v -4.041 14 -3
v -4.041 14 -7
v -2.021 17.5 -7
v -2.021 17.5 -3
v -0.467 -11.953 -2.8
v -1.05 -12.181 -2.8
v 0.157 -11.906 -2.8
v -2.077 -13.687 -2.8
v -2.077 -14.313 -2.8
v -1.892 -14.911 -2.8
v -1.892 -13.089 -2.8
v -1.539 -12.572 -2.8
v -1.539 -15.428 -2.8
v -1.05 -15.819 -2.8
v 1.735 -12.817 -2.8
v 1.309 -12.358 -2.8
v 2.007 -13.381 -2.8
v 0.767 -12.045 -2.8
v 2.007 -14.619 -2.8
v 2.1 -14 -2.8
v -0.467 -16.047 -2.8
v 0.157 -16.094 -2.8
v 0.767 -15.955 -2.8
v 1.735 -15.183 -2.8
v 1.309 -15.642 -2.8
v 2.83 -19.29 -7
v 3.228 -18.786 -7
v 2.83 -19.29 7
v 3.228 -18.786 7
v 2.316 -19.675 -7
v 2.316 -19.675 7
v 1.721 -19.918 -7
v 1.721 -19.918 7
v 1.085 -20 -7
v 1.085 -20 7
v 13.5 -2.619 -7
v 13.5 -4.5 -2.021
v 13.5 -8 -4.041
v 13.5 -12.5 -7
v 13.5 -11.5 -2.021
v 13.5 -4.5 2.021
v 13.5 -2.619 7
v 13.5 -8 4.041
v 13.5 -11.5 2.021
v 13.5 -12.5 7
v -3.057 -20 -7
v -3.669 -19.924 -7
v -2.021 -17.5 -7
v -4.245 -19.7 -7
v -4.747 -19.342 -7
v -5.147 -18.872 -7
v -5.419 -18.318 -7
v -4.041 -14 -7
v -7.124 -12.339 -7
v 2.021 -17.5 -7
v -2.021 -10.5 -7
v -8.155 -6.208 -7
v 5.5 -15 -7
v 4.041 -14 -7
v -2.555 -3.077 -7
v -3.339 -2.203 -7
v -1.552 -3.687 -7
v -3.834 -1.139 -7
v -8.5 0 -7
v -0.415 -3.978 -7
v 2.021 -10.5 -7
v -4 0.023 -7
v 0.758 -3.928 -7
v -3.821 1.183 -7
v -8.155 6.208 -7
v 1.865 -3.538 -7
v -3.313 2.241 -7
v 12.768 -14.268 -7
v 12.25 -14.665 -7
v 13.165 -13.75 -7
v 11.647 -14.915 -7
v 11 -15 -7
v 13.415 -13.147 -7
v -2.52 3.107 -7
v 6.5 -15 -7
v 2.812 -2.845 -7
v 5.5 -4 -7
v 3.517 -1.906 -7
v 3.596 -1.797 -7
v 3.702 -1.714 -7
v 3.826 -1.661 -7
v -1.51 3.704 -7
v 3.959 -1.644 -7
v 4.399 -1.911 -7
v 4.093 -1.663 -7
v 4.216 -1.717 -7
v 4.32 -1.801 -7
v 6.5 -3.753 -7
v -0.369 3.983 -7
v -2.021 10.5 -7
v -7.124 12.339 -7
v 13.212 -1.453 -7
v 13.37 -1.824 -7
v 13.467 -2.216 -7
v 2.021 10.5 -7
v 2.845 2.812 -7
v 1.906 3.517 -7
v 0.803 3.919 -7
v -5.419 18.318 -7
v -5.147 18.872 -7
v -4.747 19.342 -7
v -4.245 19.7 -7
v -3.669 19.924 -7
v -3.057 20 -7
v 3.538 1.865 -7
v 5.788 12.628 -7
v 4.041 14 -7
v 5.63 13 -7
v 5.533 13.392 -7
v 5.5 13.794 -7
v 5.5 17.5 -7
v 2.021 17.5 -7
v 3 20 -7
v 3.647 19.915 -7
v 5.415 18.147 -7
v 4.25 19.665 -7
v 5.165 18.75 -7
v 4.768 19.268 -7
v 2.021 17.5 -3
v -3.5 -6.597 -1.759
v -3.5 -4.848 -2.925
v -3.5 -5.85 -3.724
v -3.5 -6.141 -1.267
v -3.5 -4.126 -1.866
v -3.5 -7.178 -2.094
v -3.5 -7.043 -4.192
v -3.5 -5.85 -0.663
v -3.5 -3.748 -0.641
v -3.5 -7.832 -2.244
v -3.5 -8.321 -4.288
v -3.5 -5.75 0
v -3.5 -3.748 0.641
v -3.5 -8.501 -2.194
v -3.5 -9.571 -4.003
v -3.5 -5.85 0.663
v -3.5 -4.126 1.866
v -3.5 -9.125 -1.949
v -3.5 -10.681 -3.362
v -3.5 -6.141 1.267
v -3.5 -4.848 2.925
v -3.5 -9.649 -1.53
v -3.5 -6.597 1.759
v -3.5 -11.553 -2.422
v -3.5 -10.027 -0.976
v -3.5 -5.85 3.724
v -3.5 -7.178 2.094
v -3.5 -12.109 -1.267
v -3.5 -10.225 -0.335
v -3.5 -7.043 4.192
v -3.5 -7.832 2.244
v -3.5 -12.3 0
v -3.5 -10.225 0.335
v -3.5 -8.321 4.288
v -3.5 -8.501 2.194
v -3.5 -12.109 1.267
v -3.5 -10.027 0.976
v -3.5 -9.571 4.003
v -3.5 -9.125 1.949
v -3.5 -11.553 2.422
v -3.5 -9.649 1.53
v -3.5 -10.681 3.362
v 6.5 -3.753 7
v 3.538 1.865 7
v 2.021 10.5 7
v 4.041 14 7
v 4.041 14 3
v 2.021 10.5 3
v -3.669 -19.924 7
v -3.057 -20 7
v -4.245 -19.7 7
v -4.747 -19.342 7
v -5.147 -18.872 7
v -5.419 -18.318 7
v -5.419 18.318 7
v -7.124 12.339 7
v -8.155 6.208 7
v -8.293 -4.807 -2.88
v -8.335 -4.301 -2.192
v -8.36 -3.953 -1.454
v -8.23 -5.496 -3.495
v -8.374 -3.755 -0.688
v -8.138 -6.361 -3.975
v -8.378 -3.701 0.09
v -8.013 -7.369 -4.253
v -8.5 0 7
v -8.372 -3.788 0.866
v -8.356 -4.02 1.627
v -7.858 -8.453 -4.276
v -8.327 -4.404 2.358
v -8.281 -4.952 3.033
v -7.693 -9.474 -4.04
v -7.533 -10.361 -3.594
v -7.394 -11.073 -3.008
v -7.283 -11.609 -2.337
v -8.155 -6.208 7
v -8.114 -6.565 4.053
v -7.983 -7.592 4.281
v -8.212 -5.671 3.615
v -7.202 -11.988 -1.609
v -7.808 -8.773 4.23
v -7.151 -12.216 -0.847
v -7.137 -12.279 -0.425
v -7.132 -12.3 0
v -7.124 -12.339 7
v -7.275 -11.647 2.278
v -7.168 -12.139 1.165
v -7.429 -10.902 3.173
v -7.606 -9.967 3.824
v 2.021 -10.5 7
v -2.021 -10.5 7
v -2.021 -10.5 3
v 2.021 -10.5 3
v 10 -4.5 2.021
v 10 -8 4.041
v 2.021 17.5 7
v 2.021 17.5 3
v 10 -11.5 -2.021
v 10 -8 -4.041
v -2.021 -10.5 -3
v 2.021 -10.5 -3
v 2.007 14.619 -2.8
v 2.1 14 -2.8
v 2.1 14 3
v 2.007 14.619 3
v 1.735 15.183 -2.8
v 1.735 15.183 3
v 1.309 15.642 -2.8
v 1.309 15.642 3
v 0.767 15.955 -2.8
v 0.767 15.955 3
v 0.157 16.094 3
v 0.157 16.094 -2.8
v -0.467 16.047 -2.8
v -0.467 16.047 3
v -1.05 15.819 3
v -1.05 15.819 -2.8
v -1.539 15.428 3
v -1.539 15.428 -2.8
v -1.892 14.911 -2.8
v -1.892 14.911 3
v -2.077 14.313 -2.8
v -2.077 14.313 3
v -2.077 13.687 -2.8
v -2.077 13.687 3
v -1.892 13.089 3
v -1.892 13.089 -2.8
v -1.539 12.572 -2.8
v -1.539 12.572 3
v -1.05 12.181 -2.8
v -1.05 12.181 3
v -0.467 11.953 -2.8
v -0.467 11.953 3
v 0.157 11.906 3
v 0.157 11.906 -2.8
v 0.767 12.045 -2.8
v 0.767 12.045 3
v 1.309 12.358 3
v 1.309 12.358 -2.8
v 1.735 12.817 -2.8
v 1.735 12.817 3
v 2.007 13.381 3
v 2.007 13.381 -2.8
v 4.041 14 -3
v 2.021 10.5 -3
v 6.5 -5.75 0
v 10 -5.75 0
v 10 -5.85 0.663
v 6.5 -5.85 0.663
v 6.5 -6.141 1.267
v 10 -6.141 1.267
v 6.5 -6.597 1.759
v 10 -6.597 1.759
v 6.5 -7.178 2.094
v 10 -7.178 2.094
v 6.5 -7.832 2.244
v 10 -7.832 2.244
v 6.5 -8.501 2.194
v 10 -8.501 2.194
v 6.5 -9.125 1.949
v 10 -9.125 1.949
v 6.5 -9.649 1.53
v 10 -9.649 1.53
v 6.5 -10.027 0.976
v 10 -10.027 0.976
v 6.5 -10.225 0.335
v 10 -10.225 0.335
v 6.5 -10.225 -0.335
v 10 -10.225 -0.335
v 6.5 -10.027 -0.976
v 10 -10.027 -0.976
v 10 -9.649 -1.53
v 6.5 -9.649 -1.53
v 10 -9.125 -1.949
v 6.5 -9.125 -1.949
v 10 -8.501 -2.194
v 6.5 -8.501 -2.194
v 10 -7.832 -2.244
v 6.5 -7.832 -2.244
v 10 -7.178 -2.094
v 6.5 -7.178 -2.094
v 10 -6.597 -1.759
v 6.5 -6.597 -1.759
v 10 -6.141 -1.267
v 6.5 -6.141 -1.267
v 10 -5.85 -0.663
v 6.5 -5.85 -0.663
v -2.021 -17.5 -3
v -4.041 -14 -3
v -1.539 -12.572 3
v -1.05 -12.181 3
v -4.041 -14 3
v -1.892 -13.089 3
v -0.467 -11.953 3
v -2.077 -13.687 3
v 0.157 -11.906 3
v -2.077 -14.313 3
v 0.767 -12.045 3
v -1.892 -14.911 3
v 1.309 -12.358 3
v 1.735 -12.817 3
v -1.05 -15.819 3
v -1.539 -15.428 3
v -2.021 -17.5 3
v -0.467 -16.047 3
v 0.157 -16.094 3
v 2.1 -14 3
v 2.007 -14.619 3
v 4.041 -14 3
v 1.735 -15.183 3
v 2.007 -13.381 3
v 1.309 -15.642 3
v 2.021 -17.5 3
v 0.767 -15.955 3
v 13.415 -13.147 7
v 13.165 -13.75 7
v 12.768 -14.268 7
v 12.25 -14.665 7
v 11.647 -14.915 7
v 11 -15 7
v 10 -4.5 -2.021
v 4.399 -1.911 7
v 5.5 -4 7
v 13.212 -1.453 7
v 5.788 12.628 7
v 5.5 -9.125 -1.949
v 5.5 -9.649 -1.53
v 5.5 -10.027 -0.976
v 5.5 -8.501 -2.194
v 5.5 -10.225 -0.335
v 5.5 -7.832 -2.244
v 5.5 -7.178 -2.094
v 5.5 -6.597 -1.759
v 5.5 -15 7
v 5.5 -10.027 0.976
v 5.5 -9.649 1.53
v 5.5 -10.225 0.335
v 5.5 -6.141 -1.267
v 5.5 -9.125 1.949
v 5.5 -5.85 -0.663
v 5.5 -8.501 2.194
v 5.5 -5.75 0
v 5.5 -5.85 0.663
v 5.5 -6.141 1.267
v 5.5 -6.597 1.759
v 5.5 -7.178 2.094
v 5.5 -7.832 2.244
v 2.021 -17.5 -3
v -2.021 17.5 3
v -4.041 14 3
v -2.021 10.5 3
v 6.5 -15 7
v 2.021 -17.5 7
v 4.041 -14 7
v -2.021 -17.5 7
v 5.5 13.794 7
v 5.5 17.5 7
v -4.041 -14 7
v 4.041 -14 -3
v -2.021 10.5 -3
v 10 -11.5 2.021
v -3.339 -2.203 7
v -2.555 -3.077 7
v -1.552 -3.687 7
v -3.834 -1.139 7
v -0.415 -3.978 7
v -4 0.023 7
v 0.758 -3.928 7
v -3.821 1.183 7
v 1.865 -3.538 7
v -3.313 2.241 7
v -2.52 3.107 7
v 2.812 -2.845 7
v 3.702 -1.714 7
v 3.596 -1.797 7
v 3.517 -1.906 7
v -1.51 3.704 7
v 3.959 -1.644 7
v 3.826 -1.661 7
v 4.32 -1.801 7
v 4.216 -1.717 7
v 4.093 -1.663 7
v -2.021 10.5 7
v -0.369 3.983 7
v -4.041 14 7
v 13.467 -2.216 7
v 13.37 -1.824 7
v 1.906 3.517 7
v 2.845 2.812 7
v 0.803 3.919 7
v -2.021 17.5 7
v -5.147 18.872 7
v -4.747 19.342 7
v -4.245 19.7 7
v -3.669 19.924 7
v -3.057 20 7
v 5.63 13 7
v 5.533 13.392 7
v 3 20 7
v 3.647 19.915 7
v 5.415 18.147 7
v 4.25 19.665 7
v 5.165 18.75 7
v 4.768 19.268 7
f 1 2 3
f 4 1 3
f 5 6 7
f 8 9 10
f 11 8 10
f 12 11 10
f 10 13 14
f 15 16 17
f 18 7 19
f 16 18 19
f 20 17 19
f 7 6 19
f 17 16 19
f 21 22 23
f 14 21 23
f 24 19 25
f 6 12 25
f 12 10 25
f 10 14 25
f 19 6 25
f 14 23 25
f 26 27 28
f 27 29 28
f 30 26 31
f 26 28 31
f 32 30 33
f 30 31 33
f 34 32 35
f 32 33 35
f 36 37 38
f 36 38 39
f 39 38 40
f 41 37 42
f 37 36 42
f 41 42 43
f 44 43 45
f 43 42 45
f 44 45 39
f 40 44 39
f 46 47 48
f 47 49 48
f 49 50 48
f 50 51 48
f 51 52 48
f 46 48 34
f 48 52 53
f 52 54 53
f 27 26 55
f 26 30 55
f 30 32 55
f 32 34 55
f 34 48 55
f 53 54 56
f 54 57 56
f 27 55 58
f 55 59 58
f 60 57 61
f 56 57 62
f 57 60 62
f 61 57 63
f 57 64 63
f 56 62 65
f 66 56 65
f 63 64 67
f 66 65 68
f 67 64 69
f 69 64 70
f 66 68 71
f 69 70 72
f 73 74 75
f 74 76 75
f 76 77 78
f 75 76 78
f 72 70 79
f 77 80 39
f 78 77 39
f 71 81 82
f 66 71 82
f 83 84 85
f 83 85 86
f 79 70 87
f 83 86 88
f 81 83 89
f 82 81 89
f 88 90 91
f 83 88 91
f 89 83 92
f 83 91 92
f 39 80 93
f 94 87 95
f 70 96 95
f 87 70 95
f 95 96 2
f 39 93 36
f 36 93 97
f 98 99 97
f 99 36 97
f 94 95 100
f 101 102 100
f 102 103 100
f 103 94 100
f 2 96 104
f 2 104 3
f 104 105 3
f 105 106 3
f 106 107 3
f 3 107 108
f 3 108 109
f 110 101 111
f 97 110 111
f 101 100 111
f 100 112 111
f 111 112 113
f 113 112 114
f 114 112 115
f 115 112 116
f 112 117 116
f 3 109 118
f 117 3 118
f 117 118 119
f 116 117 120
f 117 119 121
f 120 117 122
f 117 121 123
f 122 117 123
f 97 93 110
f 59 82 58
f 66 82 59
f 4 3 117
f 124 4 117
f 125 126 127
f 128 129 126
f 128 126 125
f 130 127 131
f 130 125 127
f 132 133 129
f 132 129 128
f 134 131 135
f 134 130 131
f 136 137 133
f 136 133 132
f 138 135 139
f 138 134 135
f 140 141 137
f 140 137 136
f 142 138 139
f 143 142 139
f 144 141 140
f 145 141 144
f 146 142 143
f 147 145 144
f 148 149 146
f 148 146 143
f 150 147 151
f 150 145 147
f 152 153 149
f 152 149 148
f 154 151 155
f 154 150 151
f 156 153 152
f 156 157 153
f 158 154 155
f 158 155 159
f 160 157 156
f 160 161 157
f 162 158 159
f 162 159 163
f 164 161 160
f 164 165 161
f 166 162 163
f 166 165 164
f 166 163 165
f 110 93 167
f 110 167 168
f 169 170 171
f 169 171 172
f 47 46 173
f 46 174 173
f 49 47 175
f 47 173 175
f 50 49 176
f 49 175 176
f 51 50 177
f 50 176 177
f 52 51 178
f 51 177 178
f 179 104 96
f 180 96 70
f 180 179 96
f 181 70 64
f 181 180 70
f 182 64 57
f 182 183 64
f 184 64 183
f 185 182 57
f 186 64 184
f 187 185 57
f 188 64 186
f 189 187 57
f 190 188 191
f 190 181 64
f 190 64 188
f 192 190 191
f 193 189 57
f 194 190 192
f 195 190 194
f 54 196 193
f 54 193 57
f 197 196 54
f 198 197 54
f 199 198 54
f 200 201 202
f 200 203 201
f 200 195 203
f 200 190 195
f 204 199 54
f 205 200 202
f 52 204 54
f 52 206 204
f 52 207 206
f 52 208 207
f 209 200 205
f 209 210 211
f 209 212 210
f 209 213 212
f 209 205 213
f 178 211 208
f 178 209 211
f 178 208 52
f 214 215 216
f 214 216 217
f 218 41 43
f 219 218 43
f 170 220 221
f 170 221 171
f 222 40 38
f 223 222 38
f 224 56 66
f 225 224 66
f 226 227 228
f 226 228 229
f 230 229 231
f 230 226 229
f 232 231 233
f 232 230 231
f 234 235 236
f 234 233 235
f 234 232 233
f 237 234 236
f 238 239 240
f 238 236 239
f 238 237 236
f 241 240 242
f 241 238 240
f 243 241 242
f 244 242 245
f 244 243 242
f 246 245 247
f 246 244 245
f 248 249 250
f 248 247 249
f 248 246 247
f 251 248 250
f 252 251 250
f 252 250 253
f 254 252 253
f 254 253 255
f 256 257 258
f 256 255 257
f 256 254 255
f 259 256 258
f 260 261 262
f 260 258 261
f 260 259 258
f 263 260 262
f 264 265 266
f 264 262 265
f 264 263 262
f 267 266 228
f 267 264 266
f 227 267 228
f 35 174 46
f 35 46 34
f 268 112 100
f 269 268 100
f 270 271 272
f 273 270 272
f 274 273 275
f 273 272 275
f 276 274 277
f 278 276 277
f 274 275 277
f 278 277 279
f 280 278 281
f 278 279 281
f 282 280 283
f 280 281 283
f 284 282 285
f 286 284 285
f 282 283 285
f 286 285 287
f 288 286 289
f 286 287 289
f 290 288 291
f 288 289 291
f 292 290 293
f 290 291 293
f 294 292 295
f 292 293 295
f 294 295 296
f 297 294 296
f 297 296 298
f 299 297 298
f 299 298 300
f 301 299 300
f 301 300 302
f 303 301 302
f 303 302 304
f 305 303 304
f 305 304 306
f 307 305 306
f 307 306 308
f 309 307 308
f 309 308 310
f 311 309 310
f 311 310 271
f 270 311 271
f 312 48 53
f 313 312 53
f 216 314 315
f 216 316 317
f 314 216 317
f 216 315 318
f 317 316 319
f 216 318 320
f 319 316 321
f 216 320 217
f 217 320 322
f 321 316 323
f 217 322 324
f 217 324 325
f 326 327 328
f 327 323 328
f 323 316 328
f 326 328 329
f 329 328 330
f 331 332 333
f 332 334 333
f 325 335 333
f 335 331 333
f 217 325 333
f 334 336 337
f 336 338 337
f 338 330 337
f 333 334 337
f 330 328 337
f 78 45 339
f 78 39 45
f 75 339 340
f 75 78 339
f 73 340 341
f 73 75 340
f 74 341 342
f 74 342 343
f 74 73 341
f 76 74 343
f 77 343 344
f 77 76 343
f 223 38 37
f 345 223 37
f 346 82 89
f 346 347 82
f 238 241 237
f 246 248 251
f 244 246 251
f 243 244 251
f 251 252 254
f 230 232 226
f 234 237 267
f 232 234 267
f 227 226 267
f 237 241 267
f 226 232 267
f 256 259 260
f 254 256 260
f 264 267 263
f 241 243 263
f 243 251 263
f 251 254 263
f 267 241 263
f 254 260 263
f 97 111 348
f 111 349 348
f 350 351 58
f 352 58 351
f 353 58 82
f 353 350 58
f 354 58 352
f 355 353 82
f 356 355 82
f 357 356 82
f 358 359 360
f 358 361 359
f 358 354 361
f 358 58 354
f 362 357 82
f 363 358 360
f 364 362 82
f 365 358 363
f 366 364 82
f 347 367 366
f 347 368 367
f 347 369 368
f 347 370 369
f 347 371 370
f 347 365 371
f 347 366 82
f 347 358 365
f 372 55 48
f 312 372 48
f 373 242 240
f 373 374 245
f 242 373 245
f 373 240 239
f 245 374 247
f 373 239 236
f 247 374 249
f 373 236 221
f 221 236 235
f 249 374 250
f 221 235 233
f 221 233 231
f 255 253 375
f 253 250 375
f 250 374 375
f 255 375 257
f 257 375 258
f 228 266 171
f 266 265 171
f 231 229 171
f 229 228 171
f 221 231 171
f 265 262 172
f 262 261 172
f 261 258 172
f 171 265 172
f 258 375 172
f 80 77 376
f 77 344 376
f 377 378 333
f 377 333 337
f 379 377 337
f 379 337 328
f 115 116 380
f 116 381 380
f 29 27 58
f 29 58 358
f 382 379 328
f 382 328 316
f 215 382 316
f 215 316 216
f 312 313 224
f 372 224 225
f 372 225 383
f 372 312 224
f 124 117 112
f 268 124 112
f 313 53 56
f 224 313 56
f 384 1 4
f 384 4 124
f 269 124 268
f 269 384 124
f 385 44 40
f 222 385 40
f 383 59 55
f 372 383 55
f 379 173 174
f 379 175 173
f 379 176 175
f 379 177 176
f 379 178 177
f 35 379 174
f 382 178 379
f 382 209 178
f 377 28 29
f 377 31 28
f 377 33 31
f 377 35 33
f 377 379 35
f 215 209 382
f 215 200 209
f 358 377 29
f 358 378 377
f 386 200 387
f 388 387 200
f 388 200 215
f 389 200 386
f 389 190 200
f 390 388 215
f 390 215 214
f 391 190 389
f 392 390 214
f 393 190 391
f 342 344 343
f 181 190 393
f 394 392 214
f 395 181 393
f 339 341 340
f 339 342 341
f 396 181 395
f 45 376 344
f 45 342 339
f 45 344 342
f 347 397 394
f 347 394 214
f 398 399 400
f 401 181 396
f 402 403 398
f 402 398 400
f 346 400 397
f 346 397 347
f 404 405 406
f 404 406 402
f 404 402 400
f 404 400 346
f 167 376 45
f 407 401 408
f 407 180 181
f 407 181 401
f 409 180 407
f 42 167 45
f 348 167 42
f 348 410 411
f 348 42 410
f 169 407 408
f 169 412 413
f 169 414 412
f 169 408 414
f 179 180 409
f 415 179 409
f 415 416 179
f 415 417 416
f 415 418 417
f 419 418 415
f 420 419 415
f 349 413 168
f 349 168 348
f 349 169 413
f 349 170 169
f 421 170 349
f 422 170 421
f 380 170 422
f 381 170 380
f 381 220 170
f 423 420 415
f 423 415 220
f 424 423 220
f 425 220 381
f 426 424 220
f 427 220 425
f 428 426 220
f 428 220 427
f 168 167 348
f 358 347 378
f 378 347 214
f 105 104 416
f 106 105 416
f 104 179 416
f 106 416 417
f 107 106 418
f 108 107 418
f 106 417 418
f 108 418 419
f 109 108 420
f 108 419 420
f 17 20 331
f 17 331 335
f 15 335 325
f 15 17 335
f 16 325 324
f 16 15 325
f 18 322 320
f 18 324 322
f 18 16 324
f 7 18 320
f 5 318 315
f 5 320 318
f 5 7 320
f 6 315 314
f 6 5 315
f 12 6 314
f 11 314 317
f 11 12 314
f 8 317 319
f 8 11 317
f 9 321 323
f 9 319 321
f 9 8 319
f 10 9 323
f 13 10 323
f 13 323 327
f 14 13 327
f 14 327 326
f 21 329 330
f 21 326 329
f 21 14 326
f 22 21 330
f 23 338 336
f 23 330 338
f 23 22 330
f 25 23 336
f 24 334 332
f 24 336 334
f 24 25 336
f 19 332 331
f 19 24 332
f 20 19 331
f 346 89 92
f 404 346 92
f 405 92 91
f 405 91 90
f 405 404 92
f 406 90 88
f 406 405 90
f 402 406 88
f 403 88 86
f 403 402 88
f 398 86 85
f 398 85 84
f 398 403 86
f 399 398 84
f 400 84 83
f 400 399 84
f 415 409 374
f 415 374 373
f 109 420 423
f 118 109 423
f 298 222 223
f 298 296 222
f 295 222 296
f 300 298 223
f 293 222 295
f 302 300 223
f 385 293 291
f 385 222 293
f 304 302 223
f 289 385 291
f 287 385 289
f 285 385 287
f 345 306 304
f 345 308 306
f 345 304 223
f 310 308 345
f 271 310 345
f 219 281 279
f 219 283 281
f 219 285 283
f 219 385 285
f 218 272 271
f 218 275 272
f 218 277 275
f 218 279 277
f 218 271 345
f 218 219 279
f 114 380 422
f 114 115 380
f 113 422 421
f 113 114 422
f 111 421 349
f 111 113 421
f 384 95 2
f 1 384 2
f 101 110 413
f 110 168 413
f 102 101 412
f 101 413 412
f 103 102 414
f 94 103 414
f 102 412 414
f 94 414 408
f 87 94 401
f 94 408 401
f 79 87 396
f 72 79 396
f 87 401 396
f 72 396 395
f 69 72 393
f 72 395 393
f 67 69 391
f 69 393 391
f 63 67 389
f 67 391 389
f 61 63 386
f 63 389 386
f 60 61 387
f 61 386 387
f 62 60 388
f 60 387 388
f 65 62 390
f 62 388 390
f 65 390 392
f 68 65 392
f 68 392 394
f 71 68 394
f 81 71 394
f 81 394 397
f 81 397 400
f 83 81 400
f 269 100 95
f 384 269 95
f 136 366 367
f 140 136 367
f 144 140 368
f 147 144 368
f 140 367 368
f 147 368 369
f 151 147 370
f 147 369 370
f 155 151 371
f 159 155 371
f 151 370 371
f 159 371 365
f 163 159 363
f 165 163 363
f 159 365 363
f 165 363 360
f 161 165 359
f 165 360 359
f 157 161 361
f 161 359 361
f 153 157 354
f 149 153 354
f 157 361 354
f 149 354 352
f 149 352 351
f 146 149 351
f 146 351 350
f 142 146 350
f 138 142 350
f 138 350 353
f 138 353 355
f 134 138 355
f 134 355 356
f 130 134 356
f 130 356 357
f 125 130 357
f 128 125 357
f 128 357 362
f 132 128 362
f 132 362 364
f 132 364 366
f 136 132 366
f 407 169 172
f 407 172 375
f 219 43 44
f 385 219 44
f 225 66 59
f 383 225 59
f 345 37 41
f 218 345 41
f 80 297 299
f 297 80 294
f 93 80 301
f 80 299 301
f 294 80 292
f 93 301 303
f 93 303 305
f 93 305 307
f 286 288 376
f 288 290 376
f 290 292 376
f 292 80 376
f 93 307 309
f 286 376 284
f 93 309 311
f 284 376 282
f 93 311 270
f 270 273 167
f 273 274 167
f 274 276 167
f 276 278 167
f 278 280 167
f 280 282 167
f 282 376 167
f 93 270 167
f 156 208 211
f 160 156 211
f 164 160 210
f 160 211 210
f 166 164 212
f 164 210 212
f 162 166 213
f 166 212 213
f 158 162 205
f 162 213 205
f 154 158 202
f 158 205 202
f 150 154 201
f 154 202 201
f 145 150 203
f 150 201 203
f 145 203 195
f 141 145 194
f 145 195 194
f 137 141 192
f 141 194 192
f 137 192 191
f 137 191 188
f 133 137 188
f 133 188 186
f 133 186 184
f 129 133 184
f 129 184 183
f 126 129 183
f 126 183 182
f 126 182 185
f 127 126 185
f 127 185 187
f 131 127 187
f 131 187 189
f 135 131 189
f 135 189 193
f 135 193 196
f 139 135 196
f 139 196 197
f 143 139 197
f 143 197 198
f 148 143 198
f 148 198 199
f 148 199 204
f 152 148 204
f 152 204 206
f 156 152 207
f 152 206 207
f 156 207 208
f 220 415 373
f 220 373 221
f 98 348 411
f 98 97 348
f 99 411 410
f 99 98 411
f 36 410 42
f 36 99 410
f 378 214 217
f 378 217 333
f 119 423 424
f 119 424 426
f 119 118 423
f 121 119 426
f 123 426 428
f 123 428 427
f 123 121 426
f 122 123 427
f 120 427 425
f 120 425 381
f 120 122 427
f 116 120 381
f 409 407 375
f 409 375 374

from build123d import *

# Parameters (mm, degrees)
SKETCH_R        = 2.1
PAD_DEPTH       = 7
SKETCH001_R     = 2.25
POCKET_DEPTH    = 22.001
POCKET001_DEPTH = 3.5
SKETCH003_R     = 4.3
POCKET002_DEPTH = 5
SKETCH004_R     = 62
SKETCH004_R_2   = 56
POCKET003_DEPTH = 14.001
CHAMFER_SIZE2   = 3
CHAMFER_SIZE    = 5
FILLET_R        = 2.5
FILLET001_R     = 0.5
POCKET004_DEPTH = 4
SKETCH006_R     = 2.1
PAD001_DEPTH    = 0.2


with BuildPart() as part:
    # Sketch → Pad (new body, symmetric)
    with BuildSketch(Plane.XY):
        with BuildLine():
            Line((-8.5, 20), (-8.5, -20))
            Line((-8.5, -20), (5.5, -20))
            Line((5.5, -20), (5.5, -4))
            Line((5.5, -4), (3.887632, -0.941445))
            ThreePointArc((3.538431, 1.865343), (-3.969398, -0.493844), (3.887632, -0.941445))
            Line((6.5, -3.752556), (3.538431, 1.865343))
            Line((6.5, -15), (6.5, -3.752556))
            Line((13.5, -15), (6.5, -15))
            Line((13.5, -2), (13.5, -15))
            Line((5.5, 13.175467), (13.5, -2))
            Line((5.5, 20), (5.5, 13.175467))
            Line((-8.5, 20), (5.5, 20))
        make_face()
        with Locations((0, 14)):
            Circle(SKETCH_R, mode=Mode.SUBTRACT)
        with Locations((0, -14)):
            Circle(SKETCH_R, mode=Mode.SUBTRACT)
    extrude(amount=PAD_DEPTH, both=True)

    # Sketch001 (on Face10 of Pad) → Pocket (cut, through all)
    with BuildSketch(Plane.YZ.offset(13.5)):
        with Locations((-8, 0)):
            Circle(SKETCH001_R)
    extrude(amount=-POCKET_DEPTH, mode=Mode.SUBTRACT)

    # Sketch002 (on Face15 of Pocket) → Pocket001 (cut)
    with BuildSketch(Plane.YZ.offset(13.5)):
        Polygon((-4.5, 2.020726), (-8, 4.041452), (-11.5, 2.020726), (-11.5, -2.020726), (-8, -4.041452), (-4.5, -2.020726), align=None)
    extrude(amount=-POCKET001_DEPTH, mode=Mode.SUBTRACT)

    # Sketch003 (on Face2 of Pocket001) → Pocket002 (cut)
    with BuildSketch(Plane(origin=(-8.5, 0, 0), x_dir=(0, -1, 0), z_dir=(-1, 0, 0))):
        with Locations((8, 0)):
            Circle(SKETCH003_R)
    extrude(amount=-POCKET002_DEPTH, mode=Mode.SUBTRACT)

    # Sketch004 (on Face5 of Pocket002) → Pocket003 (cut, through all)
    with BuildSketch(Plane.XY.offset(7)):
        with Locations((47.5, 0)):
            Circle(SKETCH004_R)
        with Locations((47.5, 0)):
            Circle(SKETCH004_R_2, mode=Mode.SUBTRACT)
    extrude(amount=-POCKET003_DEPTH, mode=Mode.SUBTRACT)

    # Chamfer
    chamfer_edges = [part.edges().sort_by_distance(p)[0] for p in [
        (5.5, -20, 0),
    ]]
    chamfer_side = part.faces().sort_by_distance((5.5, -12.305712, 0))[0]
    chamfer(chamfer_edges, length=CHAMFER_SIZE, length2=CHAMFER_SIZE2, reference=chamfer_side)

    # Fillet
    fillet_edges = [part.edges().sort_by_distance(p)[0] for p in [
        (2.5, -20, 0),
        (-4.806787, -20, 0),
        (13.5, -15, 0),
        (5.5, 20, 0),
        (13.5, -2, 0),
        (5.5, 13.175467, 0),
        (-4.806787, 20, 0),
    ]]
    fillet(fillet_edges, radius=FILLET_R)

    # Fillet001
    fillet001_edges = [part.edges().sort_by_distance(p)[0] for p in [
        (3.887632, -0.941445, 0),
    ]]
    fillet(fillet001_edges, radius=FILLET001_R)

    # Sketch005 (on Face1 of Fillet001) → Pocket004 (cut)
    with BuildSketch(Plane(origin=(0, 0, -7), x_dir=(1, 0, 0), z_dir=(0, 0, -1))):
        Polygon((4.041452, 14), (2.020726, 17.5), (-2.020726, 17.5), (-4.041452, 14), (-2.020726, 10.5), (2.020726, 10.5), align=None)
        Polygon((4.041452, -14), (2.020726, -10.5), (-2.020726, -10.5), (-4.041452, -14), (-2.020726, -17.5), (2.020726, -17.5), align=None)
    pocket004 = extrude(amount=-POCKET004_DEPTH, mode=Mode.SUBTRACT)

    # Mirrored: Pocket004 across XY
    add(pocket004.mirror(Plane.XY), mode=Mode.SUBTRACT)

    # Sketch006 (on Face46 of Mirrored) → Pad001 (join)
    with BuildSketch(Plane(origin=(0, 0, -3), x_dir=(1, 0, 0), z_dir=(0, 0, -1))):
        with Locations((0, 14)):
            Circle(SKETCH006_R)
        with Locations((0, -14)):
            Circle(SKETCH006_R)
    extrude(amount=-PAD001_DEPTH)


solid = part.part
